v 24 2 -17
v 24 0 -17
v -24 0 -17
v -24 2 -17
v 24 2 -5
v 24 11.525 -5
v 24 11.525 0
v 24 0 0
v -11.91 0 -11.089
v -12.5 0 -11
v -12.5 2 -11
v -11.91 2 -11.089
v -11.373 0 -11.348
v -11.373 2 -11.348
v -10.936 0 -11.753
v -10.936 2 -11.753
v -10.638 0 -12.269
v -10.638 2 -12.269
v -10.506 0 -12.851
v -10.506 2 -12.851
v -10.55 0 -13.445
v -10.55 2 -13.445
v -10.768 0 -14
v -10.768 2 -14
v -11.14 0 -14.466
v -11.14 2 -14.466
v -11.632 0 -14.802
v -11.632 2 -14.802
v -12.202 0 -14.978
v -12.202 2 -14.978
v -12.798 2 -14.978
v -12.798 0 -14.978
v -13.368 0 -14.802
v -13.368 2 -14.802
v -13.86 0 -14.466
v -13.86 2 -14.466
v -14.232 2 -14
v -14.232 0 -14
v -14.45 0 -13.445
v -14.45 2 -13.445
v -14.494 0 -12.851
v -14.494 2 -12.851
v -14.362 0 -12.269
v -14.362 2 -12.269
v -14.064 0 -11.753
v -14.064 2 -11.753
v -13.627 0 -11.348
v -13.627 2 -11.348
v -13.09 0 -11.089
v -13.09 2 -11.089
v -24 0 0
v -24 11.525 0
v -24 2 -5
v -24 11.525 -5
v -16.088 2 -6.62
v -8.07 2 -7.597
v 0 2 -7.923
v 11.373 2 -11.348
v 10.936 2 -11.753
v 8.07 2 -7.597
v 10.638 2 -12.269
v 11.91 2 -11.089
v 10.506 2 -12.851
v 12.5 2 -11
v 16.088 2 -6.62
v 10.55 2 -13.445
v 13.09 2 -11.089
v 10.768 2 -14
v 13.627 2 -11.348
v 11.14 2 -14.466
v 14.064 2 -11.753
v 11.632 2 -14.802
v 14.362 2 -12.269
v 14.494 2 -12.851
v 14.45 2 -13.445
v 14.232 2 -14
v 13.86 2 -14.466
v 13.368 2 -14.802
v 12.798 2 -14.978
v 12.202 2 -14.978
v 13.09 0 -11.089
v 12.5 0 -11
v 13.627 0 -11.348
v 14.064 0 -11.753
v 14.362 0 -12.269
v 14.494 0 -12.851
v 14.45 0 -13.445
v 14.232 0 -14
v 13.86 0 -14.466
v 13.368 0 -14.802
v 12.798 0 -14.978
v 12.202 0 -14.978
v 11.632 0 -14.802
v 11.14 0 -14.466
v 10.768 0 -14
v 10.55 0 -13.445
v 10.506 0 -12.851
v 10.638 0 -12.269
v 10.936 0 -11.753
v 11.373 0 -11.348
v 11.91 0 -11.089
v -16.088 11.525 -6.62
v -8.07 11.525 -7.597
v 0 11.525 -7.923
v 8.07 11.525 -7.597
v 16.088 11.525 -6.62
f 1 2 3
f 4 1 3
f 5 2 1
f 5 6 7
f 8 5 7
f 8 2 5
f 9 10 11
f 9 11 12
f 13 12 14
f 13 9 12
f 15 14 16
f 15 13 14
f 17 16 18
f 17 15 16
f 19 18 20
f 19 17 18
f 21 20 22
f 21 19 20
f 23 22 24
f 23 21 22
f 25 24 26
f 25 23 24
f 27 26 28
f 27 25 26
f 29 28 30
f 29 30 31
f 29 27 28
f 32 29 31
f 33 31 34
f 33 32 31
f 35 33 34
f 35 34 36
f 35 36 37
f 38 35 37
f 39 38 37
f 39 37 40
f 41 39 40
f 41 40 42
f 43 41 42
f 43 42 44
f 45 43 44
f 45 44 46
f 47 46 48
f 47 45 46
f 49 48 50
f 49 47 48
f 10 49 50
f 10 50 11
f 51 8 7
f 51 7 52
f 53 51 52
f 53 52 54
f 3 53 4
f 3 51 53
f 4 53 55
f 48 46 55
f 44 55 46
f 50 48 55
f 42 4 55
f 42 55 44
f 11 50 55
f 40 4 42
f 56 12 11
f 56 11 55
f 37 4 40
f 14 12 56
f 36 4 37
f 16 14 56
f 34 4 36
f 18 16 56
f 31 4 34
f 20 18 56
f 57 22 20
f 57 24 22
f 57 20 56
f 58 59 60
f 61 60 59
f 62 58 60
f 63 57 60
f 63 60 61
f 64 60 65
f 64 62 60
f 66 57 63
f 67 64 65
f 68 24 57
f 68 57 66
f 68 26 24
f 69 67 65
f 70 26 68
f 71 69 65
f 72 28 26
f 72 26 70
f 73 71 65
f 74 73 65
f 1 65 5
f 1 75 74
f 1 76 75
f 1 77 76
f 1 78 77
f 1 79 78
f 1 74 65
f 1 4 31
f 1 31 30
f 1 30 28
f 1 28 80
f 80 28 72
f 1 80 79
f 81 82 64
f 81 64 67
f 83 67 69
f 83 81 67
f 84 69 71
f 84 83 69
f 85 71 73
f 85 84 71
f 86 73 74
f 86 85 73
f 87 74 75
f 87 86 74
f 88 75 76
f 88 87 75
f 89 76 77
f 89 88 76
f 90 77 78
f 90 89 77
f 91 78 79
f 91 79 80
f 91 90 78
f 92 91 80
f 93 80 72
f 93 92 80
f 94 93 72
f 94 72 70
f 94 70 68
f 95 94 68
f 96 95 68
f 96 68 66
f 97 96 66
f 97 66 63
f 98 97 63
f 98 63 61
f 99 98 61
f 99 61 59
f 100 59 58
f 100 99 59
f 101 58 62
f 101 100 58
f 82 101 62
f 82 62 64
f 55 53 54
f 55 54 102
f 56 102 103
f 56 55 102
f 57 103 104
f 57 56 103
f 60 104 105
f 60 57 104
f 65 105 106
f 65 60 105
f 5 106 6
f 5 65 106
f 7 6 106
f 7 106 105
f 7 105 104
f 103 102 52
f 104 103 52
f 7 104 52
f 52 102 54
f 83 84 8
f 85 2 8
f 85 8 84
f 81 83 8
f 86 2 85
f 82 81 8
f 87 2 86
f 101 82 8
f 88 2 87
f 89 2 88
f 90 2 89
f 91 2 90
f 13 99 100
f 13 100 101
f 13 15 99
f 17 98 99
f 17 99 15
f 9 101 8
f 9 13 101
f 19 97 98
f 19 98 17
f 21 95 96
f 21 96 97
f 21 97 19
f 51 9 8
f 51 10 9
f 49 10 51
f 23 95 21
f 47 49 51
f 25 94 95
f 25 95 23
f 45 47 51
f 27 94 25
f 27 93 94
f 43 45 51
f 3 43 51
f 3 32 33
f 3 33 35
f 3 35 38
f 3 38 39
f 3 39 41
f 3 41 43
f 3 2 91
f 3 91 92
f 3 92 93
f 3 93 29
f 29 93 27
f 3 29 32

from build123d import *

# Parameters (mm, degrees)
BOSS_EXTRUDE1_DEPTH = 11.525
SKETCH1_3_R         = 2
BOSS_EXTRUDE2_DEPTH = 2


with BuildPart() as part:
    # Sketch1 → Boss-Extrude1 (new body)
    with BuildSketch(Plane(origin=(0, 0, 0), x_dir=(1, 0, 0), z_dir=(0, 1, 0))):
        with BuildLine():
            Line((-24, 5), (-24, 0))
            Line((-24, 0), (24, 0))
            Line((24, 0), (24, 5))
            ThreePointArc((24, 5), (0, 7.922711204), (-24, 5))
        make_face()
    extrude(amount=BOSS_EXTRUDE1_DEPTH)

    # Sketch1<3> → Boss-Extrude2 (add)
    with BuildSketch(Plane(origin=(0, 0, 0), x_dir=(1, 0, 0), z_dir=(0, 1, 0))):
        with BuildLine():
            Line((-24, 17), (-24, 5))
            ThreePointArc((-24, 5), (0, 7.922711204), (24, 5))
            Line((24, 5), (24, 17))
            Line((24, 17), (-24, 17))
        make_face()
        with Locations((-12.5, 13)):
            Circle(SKETCH1_3_R, mode=Mode.SUBTRACT)
        with Locations((12.5, 13)):
            Circle(SKETCH1_3_R, mode=Mode.SUBTRACT)
    extrude(amount=BOSS_EXTRUDE2_DEPTH)


solid = part.part
